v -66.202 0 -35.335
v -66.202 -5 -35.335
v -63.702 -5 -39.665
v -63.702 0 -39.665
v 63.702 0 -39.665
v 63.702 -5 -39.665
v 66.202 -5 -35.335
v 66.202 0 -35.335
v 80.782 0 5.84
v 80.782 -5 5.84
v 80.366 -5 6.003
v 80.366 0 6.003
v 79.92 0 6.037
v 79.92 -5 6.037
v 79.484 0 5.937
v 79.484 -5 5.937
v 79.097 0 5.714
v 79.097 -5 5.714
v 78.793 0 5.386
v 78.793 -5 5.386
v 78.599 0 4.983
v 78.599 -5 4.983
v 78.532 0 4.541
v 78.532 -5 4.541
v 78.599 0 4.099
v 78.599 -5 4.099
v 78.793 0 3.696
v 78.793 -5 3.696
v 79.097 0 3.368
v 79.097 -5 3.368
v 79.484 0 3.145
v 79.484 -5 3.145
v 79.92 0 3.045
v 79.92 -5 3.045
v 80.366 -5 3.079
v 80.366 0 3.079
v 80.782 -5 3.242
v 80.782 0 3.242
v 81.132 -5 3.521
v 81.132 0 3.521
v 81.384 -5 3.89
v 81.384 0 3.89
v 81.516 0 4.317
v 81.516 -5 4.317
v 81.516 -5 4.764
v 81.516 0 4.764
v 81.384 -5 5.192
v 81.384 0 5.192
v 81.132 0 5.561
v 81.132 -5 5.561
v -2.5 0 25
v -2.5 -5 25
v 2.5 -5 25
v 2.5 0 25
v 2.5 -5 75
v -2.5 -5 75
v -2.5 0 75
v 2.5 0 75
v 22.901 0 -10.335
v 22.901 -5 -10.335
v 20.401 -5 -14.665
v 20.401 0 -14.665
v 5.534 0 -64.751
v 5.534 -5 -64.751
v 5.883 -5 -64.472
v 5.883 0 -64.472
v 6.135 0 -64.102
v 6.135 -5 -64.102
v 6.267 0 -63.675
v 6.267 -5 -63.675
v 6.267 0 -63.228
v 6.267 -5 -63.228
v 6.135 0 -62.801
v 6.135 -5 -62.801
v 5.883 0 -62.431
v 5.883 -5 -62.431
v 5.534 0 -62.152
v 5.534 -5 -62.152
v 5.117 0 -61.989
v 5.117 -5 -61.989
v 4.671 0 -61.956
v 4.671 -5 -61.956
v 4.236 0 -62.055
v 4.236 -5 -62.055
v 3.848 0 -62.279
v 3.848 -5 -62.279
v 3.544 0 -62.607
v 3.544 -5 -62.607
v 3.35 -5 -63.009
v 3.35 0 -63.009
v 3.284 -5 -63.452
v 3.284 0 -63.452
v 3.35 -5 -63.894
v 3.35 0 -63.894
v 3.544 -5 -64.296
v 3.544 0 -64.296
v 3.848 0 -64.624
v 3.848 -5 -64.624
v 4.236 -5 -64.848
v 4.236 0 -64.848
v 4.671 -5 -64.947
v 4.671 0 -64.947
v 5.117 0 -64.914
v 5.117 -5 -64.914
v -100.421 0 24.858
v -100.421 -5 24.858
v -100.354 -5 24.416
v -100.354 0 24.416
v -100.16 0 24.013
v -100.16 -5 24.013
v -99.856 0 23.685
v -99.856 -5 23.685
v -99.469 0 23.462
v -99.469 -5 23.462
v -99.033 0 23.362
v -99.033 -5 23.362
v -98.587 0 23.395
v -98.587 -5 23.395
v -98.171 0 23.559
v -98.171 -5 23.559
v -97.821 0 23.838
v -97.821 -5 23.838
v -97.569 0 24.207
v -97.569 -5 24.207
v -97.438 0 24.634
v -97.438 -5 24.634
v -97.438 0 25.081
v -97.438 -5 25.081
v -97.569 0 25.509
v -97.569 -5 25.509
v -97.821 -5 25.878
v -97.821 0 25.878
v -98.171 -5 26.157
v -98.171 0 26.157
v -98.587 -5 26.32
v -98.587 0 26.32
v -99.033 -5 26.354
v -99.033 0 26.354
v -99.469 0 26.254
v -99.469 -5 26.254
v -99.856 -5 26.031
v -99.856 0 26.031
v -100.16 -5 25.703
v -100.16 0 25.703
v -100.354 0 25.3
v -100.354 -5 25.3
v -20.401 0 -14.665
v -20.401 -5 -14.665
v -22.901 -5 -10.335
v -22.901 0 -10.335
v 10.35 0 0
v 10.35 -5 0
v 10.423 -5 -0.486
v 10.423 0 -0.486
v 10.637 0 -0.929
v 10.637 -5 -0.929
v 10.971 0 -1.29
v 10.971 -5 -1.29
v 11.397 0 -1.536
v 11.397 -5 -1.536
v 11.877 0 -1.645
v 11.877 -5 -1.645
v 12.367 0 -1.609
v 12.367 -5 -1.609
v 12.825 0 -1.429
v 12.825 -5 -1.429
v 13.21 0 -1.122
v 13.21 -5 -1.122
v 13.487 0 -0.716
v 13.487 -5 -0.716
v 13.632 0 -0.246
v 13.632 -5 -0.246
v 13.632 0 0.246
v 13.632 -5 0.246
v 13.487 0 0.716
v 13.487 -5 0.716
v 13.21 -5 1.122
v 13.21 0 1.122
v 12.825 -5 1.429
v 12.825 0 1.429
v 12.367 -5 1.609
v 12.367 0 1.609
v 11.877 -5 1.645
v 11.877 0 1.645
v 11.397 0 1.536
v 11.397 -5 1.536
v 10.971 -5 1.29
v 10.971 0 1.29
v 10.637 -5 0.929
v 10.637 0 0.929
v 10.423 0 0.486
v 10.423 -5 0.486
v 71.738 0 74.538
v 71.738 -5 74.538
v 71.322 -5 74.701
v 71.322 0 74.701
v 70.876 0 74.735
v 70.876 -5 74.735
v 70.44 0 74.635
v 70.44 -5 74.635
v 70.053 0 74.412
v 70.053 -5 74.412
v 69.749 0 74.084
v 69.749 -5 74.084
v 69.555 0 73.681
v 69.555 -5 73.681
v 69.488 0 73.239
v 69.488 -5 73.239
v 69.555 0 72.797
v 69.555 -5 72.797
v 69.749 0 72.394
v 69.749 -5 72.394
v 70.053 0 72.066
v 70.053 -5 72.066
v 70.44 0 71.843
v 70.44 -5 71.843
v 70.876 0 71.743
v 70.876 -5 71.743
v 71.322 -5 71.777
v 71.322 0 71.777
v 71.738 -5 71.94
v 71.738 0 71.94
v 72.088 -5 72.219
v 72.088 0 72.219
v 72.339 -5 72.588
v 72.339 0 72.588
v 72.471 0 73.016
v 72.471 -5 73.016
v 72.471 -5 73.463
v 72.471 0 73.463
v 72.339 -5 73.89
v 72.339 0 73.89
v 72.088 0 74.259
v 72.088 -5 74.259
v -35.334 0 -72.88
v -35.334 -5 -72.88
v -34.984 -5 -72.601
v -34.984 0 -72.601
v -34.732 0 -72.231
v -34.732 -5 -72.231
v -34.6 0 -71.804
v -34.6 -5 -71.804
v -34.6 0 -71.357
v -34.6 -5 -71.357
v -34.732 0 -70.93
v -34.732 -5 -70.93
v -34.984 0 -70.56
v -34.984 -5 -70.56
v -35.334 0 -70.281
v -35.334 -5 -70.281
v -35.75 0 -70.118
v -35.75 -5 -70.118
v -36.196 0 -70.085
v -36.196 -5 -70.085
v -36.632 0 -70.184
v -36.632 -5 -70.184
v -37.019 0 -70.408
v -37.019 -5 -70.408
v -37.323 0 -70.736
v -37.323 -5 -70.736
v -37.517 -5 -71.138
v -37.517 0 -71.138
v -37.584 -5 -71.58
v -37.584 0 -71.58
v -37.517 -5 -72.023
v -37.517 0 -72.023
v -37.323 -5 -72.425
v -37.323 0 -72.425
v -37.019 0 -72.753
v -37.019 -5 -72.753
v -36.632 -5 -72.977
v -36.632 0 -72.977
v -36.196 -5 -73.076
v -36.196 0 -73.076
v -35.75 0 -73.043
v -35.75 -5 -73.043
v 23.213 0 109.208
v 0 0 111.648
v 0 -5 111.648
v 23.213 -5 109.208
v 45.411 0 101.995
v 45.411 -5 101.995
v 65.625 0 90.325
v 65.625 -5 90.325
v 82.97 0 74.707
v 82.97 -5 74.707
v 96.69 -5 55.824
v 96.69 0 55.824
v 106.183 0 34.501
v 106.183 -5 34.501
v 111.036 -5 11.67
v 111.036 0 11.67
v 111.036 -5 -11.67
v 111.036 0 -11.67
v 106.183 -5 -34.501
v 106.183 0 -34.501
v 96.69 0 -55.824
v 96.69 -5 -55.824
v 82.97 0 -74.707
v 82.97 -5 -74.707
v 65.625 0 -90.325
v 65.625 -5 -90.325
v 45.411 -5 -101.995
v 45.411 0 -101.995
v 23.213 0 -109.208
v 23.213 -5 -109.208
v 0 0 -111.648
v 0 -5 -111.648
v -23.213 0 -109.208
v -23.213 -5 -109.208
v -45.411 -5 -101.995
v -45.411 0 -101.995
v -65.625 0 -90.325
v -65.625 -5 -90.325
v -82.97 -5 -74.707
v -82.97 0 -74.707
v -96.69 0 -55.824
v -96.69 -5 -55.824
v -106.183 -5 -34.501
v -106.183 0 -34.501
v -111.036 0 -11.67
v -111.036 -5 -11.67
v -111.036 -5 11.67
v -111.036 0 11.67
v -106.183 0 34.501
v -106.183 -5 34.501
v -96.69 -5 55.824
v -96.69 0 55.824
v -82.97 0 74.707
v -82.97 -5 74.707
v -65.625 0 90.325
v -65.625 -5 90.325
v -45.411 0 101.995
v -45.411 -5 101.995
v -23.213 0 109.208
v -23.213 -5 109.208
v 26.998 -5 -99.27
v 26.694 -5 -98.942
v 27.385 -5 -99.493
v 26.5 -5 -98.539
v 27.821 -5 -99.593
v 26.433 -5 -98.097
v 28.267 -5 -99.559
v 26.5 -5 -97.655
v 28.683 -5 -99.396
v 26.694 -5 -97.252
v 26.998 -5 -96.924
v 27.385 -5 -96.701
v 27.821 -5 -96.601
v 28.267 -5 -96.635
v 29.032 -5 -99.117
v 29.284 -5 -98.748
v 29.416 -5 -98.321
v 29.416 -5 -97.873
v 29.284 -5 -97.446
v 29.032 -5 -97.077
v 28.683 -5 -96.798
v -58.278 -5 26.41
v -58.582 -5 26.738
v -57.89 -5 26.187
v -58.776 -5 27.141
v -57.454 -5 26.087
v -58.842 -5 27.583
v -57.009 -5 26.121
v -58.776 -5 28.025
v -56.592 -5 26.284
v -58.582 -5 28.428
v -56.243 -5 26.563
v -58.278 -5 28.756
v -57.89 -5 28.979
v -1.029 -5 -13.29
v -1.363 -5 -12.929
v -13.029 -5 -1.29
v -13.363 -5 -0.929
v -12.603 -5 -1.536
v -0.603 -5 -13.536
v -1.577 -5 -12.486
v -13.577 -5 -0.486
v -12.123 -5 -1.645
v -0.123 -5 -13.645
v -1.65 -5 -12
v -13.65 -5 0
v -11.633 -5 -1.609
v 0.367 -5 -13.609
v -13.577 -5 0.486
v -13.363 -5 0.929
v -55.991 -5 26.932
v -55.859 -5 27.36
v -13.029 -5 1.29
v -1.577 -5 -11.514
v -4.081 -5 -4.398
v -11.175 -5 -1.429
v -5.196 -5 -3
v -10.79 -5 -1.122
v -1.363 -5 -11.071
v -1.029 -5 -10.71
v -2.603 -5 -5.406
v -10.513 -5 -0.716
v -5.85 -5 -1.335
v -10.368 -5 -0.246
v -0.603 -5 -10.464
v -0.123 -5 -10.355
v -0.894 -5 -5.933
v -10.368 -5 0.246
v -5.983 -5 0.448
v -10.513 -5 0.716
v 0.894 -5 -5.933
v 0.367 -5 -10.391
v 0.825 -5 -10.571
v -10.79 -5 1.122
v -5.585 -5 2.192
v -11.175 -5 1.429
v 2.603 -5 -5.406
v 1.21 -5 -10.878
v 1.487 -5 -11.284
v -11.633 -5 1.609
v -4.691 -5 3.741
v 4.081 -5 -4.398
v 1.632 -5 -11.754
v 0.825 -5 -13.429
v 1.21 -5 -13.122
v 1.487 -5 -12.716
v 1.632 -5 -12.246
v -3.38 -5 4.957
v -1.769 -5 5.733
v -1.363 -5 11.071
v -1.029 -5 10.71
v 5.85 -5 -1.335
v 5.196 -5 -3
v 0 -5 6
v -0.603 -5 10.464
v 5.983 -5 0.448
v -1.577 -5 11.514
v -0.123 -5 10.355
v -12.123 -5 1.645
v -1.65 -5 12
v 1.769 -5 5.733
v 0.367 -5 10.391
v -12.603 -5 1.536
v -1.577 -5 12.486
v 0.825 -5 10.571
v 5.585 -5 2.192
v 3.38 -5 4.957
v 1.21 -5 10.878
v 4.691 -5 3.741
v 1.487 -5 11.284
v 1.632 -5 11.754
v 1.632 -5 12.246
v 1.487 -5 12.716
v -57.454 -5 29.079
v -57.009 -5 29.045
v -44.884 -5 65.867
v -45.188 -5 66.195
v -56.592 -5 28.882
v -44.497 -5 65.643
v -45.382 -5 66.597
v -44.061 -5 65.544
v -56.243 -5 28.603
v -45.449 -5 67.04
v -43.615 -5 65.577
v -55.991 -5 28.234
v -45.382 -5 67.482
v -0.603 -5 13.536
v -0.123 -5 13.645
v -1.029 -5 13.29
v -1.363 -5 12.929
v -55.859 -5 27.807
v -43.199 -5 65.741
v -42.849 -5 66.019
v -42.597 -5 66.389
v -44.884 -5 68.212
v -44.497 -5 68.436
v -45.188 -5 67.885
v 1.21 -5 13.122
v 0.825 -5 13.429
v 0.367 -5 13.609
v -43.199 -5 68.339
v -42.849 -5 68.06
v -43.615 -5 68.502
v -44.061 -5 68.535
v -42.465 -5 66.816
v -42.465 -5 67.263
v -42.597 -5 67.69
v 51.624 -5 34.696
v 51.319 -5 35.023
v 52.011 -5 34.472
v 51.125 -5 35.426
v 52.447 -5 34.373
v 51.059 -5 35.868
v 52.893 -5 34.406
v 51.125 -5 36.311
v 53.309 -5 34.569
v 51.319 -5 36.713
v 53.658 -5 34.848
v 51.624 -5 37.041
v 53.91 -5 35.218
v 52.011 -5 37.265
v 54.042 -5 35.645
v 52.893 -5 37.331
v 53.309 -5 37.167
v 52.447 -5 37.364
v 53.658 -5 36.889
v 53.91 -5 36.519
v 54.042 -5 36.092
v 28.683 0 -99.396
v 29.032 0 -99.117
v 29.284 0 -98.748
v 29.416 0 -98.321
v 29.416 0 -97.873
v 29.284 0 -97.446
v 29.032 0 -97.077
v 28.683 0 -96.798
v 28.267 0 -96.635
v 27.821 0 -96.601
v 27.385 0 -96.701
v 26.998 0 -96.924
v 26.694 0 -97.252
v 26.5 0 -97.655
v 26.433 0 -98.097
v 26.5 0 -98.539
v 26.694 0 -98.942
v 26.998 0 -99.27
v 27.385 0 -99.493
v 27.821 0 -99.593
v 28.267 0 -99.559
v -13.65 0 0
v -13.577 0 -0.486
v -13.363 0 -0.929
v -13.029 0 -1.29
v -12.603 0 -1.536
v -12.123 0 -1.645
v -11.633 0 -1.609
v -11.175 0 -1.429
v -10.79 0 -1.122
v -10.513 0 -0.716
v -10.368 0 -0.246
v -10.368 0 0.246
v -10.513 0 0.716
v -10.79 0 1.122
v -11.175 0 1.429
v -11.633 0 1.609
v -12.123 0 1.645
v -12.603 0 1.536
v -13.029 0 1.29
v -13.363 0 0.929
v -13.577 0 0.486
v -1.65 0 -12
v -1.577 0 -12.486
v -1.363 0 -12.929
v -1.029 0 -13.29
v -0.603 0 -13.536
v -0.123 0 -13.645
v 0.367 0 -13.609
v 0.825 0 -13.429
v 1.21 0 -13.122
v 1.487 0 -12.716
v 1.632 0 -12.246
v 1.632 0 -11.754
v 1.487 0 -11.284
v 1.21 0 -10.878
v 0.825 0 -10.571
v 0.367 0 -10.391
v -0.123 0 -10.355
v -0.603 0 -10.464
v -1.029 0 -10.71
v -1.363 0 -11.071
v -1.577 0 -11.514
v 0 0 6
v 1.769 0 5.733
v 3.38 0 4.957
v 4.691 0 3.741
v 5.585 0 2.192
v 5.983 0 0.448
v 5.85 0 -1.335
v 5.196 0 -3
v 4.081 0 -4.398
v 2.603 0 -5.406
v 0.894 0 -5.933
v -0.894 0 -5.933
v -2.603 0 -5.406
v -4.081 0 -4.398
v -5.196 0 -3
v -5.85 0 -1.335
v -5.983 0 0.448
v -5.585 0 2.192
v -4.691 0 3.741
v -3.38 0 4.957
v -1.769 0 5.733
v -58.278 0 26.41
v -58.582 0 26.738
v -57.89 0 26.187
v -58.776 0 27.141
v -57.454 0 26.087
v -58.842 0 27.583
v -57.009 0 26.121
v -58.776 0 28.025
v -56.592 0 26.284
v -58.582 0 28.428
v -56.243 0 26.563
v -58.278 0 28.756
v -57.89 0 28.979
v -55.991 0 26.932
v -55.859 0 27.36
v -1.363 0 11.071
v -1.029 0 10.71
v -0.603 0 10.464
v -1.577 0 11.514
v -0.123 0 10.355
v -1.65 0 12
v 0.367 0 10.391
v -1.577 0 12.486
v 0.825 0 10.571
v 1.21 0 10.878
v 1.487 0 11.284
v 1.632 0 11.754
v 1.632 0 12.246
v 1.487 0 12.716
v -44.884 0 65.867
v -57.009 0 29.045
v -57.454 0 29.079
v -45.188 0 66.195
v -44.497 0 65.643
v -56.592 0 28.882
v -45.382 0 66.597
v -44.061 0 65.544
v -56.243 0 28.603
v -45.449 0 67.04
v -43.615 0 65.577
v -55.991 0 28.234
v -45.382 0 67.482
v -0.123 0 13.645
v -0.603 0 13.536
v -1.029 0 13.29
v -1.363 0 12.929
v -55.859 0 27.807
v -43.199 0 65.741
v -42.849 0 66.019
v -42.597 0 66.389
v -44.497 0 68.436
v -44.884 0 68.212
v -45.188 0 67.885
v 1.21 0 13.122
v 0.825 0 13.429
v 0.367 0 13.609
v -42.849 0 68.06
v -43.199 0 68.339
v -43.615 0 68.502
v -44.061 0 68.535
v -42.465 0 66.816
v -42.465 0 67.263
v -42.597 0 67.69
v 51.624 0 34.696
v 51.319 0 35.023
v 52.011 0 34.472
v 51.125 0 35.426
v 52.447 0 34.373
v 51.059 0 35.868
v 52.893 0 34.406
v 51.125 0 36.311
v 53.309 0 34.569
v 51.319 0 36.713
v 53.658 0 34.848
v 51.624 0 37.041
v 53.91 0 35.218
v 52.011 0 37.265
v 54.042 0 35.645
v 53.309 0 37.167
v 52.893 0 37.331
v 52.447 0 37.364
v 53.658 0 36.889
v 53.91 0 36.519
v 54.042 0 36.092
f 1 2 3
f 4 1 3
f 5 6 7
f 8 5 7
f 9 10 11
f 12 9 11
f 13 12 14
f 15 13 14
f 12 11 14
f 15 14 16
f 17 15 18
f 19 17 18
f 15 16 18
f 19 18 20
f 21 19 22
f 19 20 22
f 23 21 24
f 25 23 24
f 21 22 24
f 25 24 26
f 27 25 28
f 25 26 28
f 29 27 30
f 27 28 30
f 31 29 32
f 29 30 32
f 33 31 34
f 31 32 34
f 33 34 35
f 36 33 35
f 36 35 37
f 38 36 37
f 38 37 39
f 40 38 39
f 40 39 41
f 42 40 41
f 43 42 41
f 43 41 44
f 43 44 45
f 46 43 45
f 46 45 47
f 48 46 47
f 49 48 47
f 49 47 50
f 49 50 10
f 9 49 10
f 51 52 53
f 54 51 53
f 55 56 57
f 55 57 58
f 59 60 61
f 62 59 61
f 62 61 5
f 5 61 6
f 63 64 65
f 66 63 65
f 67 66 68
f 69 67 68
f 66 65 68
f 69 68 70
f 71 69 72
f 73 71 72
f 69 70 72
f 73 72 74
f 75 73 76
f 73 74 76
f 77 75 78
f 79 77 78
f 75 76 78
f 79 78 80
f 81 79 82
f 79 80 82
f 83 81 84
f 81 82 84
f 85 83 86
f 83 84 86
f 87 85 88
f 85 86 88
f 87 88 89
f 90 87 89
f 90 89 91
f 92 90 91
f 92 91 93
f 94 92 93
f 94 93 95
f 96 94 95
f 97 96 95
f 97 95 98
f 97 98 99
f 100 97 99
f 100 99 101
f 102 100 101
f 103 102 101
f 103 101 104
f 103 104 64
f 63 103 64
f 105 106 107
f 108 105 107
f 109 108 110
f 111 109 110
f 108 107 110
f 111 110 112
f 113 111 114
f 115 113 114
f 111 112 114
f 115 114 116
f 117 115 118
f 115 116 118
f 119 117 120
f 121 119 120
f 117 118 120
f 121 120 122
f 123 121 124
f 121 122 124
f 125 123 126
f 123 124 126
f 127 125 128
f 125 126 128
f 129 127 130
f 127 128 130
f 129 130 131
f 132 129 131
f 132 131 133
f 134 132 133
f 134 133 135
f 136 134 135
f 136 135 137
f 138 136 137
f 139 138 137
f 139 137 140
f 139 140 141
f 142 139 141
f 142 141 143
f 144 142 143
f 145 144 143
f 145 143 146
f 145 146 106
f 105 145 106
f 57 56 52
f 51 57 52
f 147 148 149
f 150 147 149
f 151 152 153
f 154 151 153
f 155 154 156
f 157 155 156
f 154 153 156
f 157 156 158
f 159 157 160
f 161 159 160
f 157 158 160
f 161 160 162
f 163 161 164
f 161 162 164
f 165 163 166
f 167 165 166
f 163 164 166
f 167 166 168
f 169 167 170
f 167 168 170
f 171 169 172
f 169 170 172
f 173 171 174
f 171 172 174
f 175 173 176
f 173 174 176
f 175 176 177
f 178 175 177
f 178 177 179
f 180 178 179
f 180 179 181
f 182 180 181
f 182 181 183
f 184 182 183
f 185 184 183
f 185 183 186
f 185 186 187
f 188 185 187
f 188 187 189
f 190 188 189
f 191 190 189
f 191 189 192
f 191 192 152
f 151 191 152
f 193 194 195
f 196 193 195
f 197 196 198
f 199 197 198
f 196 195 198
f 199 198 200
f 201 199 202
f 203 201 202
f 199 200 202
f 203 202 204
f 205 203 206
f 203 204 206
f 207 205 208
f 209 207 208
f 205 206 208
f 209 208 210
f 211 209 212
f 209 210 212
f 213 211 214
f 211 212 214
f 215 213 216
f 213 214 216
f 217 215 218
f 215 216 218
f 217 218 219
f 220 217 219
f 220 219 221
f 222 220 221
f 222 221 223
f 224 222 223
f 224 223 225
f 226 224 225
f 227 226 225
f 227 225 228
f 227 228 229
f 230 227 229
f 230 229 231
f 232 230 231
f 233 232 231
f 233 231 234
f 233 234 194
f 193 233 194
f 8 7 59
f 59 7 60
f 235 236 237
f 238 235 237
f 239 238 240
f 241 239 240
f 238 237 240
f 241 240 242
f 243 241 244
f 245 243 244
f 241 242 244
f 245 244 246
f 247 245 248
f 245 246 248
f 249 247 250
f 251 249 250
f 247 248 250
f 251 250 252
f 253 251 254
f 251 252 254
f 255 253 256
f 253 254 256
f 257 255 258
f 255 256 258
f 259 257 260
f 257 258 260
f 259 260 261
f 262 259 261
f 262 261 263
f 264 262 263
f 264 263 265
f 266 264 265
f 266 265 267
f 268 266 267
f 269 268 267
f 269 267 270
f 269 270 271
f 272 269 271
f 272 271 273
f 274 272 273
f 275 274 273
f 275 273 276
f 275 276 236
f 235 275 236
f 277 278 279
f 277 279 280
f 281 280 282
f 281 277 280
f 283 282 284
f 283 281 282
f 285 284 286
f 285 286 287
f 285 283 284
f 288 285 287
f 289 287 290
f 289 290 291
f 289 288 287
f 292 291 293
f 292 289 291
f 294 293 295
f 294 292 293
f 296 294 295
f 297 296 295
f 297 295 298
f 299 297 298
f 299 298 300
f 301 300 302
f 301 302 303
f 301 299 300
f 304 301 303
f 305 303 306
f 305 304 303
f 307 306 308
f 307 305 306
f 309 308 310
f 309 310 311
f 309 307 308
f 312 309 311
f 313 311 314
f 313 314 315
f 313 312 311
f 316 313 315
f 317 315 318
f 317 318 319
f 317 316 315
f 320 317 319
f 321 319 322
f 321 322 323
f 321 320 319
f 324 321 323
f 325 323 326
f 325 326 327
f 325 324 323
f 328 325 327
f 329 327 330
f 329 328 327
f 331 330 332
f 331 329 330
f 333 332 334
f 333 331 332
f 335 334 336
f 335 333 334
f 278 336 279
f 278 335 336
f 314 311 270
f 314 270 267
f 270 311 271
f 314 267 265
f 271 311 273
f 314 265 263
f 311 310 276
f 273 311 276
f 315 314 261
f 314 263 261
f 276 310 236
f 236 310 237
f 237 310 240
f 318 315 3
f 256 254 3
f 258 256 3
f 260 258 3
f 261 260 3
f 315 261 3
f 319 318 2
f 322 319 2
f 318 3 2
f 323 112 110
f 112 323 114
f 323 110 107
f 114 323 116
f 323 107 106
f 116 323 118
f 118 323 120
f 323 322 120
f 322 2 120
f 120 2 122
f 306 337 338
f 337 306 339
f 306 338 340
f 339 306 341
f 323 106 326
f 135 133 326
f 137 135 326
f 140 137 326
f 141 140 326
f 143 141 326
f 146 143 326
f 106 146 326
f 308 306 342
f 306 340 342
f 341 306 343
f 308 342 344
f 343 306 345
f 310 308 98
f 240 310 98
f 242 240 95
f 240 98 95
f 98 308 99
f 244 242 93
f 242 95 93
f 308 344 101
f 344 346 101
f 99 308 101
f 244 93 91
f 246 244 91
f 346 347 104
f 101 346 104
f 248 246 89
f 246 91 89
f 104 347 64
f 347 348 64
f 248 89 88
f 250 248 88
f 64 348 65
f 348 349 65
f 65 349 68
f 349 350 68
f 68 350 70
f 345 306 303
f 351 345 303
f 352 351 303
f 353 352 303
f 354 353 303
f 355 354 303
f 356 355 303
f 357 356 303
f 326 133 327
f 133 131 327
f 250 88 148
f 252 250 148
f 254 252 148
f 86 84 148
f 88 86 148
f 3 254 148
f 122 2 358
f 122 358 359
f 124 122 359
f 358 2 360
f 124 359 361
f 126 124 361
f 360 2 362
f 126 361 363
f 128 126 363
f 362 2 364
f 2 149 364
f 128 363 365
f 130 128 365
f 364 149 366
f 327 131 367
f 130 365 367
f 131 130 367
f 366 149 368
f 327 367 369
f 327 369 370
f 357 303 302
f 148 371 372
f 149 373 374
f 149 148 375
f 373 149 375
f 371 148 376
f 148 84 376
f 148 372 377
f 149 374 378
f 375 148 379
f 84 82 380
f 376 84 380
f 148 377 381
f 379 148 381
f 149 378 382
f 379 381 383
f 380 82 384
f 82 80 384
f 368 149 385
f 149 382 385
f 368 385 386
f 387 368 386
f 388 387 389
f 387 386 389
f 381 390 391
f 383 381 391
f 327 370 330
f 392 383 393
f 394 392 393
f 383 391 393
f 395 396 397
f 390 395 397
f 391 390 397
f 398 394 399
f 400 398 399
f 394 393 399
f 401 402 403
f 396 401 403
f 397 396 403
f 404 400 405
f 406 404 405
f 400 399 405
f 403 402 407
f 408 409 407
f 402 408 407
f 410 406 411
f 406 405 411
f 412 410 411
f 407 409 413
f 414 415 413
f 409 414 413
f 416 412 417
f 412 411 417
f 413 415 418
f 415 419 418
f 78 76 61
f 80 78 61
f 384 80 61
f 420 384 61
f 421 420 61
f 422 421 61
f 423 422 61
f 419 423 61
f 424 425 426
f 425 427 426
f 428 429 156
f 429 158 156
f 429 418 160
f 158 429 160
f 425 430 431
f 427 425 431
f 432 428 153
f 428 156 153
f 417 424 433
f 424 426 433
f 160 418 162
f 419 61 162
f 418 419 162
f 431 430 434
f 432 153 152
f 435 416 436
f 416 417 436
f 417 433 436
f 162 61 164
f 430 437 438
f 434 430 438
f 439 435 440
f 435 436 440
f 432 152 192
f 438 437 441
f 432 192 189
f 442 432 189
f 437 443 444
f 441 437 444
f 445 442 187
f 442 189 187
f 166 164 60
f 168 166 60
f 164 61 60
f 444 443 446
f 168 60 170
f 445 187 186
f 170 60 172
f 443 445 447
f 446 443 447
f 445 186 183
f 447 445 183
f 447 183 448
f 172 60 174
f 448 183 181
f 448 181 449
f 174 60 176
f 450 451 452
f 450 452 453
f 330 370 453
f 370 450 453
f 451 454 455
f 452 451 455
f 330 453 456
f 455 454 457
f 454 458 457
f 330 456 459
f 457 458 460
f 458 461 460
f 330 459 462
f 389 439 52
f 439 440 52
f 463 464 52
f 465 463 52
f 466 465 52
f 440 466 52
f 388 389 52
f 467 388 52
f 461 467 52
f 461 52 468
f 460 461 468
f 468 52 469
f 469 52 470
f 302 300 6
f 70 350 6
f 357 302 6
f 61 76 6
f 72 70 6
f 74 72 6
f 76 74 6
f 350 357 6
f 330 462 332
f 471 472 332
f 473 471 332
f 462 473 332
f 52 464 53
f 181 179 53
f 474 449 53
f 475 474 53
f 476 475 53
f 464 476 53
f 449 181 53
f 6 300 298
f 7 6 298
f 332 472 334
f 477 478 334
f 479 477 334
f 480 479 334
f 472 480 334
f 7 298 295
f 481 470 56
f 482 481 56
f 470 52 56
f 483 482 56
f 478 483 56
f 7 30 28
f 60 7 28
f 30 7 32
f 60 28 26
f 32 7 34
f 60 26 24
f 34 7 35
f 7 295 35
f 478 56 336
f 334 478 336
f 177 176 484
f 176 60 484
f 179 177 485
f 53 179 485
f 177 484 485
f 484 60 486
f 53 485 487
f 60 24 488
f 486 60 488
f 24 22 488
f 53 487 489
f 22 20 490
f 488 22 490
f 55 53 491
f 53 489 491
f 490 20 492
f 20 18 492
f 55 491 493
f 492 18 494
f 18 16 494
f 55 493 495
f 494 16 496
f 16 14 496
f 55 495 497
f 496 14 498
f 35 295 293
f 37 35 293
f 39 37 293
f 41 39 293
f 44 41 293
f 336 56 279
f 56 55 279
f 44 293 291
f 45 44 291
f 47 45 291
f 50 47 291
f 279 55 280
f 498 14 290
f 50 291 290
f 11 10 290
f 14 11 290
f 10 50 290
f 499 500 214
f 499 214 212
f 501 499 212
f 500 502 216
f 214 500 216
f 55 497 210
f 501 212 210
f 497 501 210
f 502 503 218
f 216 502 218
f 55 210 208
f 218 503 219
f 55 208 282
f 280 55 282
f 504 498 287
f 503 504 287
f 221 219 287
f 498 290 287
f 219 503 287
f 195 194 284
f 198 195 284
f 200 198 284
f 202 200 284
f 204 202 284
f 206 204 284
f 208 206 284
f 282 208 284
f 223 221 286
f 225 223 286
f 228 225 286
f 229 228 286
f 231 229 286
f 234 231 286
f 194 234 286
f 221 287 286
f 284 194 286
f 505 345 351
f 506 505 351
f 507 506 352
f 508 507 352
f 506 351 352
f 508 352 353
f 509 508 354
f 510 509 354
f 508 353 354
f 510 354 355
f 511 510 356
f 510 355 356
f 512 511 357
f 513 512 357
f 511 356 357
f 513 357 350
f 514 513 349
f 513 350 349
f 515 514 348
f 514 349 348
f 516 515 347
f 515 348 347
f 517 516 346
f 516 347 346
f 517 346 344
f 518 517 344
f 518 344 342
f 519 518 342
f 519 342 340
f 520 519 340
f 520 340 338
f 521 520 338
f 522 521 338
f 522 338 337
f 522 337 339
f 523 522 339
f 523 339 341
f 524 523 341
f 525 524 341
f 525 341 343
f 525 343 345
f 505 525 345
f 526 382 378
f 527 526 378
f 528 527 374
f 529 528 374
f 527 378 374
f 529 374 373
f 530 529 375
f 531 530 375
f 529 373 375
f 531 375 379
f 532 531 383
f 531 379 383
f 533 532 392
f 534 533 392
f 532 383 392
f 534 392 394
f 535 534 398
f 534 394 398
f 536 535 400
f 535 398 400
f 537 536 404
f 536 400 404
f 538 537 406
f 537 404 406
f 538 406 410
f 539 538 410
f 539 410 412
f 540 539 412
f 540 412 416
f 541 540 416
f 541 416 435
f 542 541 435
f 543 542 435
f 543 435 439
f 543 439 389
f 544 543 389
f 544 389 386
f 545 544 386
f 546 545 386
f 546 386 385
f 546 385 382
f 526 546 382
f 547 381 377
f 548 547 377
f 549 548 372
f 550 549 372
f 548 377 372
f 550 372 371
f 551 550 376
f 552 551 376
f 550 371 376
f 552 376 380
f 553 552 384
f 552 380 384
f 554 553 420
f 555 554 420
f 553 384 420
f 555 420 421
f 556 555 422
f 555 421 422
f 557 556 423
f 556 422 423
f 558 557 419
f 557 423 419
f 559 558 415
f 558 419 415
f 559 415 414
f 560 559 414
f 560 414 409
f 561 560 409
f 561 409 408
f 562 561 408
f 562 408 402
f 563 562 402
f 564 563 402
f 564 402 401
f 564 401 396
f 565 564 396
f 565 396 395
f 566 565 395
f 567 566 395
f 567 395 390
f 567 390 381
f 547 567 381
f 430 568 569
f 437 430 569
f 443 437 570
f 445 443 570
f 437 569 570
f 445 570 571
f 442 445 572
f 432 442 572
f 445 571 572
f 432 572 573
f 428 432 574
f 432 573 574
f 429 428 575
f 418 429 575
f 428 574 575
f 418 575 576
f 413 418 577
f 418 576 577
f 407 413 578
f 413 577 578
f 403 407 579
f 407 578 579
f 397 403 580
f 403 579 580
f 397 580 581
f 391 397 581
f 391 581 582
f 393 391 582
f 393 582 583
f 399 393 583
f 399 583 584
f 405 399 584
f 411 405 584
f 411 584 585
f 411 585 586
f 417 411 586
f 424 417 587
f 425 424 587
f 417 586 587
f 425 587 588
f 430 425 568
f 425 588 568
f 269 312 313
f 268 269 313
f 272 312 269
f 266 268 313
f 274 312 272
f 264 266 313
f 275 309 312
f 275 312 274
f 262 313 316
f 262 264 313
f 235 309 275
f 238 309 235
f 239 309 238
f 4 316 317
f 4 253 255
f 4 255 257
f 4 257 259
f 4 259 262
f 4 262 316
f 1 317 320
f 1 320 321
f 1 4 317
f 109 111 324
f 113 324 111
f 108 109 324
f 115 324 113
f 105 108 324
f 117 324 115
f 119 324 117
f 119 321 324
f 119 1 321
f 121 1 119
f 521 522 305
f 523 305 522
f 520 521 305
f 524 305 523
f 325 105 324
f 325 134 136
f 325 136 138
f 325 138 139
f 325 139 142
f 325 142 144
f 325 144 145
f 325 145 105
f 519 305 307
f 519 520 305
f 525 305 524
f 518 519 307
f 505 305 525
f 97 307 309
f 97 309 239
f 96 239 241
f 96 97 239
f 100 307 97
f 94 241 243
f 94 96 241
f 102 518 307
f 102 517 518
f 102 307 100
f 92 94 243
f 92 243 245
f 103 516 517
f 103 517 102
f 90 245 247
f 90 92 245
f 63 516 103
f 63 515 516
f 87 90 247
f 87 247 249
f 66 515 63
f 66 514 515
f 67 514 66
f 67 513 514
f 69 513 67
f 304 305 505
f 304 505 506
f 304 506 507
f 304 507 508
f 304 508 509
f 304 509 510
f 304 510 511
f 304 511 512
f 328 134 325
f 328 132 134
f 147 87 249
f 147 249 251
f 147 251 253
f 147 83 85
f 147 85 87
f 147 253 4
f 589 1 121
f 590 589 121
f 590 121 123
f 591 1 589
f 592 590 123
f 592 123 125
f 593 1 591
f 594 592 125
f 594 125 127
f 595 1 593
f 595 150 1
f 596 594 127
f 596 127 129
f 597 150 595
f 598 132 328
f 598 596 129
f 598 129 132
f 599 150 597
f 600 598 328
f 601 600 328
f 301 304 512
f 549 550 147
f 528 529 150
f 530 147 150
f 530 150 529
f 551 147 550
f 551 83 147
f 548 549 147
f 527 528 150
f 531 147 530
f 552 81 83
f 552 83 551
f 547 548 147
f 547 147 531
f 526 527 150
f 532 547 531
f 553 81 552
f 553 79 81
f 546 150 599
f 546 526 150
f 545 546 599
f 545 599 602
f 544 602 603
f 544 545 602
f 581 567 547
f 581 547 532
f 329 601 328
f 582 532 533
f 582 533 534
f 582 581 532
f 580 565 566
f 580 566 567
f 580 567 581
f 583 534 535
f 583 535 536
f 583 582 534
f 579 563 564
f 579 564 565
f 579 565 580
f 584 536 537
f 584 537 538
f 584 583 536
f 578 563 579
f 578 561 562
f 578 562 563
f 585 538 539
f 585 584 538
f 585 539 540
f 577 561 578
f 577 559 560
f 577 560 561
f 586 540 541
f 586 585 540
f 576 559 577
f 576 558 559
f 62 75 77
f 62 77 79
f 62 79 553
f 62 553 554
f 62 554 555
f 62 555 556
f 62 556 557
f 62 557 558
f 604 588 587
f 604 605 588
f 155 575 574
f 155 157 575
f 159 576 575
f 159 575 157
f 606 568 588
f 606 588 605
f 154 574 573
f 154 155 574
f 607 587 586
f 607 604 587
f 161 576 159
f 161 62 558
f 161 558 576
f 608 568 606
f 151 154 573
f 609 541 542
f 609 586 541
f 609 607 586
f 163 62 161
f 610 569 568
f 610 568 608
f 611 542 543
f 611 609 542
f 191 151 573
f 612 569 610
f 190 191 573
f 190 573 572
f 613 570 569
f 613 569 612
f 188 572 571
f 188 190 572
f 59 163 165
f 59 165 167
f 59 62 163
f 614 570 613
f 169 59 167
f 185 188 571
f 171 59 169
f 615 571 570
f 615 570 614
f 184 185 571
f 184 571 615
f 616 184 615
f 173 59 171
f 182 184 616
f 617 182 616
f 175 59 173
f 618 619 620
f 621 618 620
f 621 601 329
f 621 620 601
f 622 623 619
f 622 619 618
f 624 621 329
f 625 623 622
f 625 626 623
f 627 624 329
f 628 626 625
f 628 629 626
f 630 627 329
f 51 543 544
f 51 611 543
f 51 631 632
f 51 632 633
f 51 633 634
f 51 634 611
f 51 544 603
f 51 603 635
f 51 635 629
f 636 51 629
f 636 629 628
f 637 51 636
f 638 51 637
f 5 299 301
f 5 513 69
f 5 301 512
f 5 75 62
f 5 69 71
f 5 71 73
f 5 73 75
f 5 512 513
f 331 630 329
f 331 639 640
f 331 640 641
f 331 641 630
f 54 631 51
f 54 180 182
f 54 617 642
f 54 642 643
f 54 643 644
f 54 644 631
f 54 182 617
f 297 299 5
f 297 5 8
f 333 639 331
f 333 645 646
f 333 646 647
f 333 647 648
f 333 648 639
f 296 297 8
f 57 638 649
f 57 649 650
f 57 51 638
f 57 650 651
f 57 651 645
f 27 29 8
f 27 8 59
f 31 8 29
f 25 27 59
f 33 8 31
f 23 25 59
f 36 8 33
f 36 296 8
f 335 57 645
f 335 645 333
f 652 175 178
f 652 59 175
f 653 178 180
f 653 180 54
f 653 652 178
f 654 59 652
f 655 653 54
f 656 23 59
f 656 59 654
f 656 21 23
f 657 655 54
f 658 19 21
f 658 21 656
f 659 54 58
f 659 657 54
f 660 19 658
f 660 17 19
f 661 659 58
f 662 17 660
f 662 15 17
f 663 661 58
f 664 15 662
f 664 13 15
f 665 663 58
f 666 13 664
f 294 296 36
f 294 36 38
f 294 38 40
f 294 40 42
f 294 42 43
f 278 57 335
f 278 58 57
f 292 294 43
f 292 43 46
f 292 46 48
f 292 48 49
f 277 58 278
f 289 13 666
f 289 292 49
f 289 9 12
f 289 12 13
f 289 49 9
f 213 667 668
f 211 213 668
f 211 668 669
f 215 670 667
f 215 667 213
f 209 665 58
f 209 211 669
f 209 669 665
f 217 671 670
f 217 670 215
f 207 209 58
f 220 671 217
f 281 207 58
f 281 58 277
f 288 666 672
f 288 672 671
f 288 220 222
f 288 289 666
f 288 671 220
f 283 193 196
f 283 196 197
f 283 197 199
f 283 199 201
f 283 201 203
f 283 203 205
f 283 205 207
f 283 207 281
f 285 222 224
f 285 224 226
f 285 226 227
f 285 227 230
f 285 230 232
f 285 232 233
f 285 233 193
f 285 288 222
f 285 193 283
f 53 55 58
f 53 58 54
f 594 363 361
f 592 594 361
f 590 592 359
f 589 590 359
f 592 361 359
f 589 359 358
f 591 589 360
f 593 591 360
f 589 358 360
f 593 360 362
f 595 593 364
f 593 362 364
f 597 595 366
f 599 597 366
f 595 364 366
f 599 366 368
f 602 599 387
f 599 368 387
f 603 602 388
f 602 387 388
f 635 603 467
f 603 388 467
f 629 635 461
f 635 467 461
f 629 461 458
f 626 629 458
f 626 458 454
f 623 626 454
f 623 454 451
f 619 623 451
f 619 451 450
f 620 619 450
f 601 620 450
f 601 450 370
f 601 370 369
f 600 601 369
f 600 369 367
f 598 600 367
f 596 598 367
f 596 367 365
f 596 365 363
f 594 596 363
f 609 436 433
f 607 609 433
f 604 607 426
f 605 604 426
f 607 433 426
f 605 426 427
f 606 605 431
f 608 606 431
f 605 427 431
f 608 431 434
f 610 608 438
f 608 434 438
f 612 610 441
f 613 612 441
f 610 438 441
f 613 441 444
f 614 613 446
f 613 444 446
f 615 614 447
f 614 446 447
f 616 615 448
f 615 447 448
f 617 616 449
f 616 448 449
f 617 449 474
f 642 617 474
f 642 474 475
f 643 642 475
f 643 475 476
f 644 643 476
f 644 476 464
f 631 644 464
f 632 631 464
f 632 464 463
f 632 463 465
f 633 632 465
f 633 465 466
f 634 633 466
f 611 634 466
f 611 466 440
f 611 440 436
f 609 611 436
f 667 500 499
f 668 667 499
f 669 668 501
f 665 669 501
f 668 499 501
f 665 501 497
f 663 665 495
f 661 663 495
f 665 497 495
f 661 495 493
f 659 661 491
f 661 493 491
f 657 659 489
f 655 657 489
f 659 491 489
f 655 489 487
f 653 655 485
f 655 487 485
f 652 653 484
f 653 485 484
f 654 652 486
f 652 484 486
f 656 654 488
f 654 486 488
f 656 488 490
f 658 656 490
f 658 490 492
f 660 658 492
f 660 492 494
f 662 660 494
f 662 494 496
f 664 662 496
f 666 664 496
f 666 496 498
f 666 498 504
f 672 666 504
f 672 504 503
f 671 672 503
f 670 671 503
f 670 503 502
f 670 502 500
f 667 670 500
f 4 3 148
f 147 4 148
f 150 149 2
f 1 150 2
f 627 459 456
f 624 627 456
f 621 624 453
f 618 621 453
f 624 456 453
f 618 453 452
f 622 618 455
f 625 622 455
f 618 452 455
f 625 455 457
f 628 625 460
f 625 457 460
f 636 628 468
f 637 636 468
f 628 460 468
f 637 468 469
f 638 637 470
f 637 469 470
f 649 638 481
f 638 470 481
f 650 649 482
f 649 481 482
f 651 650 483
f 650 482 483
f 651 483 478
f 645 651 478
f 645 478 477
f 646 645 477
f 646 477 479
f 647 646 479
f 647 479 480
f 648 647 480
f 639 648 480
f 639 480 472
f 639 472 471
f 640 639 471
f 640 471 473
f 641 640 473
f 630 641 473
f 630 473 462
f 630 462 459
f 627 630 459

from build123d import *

# Parameters (mm, degrees)
SKETCH_1_R               = 6
EXTRUDE_1_DEPTH          = 5
CUT_EXTRUDE_1_DEPTH      = 142.435598161
CUT_EXTRUDE_1_DEPTH_BACK = 142.435598161
SKETCH_5_W               = 5
SKETCH_5_H               = 50
SKETCH_6_R               = 111.64768953
EXTRUDE_4_DEPTH          = 5
F_3_0MM_1_D              = 3
PATTERN_CIRCULAR_1_COUNT = 3
HOLE_WIZARD_M4_1_D       = 3.3


with BuildPart() as part:
    # 草圖1 → 填料-伸長1 (new body)
    with BuildSketch(Plane(origin=(0, 0, 0), x_dir=(1, 0, 0), z_dir=(0, 1, 0))):
        with BuildLine():
            ThreePointArc((-54.140127389, 84.076433121), (-86.602540378, 50), (-99.882390637, 4.848509122))
            ThreePointArc((-99.882390637, 4.848509122), (-94.722486108, -4.890404948), (-83.701905284, -5.024047358))
            ThreePointArc((-83.701905284, -5.024047358), (-32.475952642, -18.75), (-46.201905284, -69.975952642))
            ThreePointArc((-46.201905284, -69.975952642), (-51.596457973, -79.586876805), (-45.742263248, -88.924942243))
            ThreePointArc((-45.742263248, -88.924942243), (0, -100), (45.742263248, -88.924942243))
            ThreePointArc((45.742263248, -88.924942243), (51.596457973, -79.586876805), (46.201905284, -69.975952642))
            ThreePointArc((46.201905284, -69.975952642), (32.475952642, -18.75), (83.701905284, -5.024047358))
            ThreePointArc((83.701905284, -5.024047358), (94.722486108, -4.890404948), (99.882390637, 4.848509122))
            ThreePointArc((99.882390637, 4.848509122), (86.602540378, 50), (54.140127389, 84.076433121))
            ThreePointArc((54.140127389, 84.076433121), (43.126028135, 84.477281753), (37.5, 75))
            ThreePointArc((37.5, 75), (0, 37.5), (-37.5, 75))
            ThreePointArc((-37.5, 75), (-43.126028135, 84.477281753), (-54.140127389, 84.076433121))
        make_face()
        with Locations(Location((0, 0, 0), (0, 0, 270))):
            Circle(SKETCH_1_R, mode=Mode.SUBTRACT)
    extrude(amount=-EXTRUDE_1_DEPTH)

    # 草圖5 → 除料-伸長1 (cut, two sides: drawn at the far end of the back side and taken through both)
    with BuildSketch(Plane(origin=(0, 0, 0), x_dir=(1, 0, 0), z_dir=(0, 1, 0)).offset(-CUT_EXTRUDE_1_DEPTH_BACK)):
        with BuildLine():
            ThreePointArc((18.659757868, -98.243643236), (-14.320442433, -98.969313065), (-45.742263248, -88.924942243))
            ThreePointArc((-45.742263248, -88.924942243), (-51.596457973, -79.586876805), (-46.201905284, -69.975952642))
            ThreePointArc((-46.201905284, -69.975952642), (-35.201155023, -60.328553588), (-28.729686798, -47.205714191))
            ThreePointArc((-28.729686798, -47.205714191), (-19.144613028, -85.825688538), (18.659757868, -98.243643236))
        make_face()
        with BuildLine():
            ThreePointArc((75.751611869, 65.28164596), (92.870160526, 37.082789592), (99.882390637, 4.848509122))
            ThreePointArc((99.882390637, 4.848509122), (94.722486108, -4.890404948), (83.701905284, -5.024047358))
            ThreePointArc((83.701905284, -5.024047358), (69.846637492, -0.320817698), (55.246191092, -1.277781514))
            ThreePointArc((55.246191092, -1.277781514), (83.899533086, 26.333123041), (75.751611869, 65.28164596))
        make_face()
        Polygon((-20.400635095, 14.665063509), (-22.900635095, 10.334936491), (-66.201905284, 35.334936491), (-63.701905284, 39.665063509), align=None)
        with Locations((0, -50)):
            Rectangle(SKETCH_5_W, SKETCH_5_H)
        Polygon((22.900635095, 10.334936491), (20.400635095, 14.665063509), (63.701905284, 39.665063509), (66.201905284, 35.334936491), align=None)
        with BuildLine():
            ThreePointArc((-37.5, 75), (-34.645482469, 60.649371286), (-26.516504294, 48.483495706))
            ThreePointArc((-26.516504294, 48.483495706), (-64.754920057, 59.492565497), (-94.411369737, 32.961997276))
            ThreePointArc((-94.411369737, 32.961997276), (-78.549718093, 61.886523473), (-54.140127389, 84.076433121))
            ThreePointArc((-54.140127389, 84.076433121), (-43.126028135, 84.477281753), (-37.5, 75))
        make_face()
    extrude(amount=CUT_EXTRUDE_1_DEPTH + CUT_EXTRUDE_1_DEPTH_BACK, mode=Mode.SUBTRACT)

    # 草圖6 → 填料-伸長4 (add)
    # profile 1 of 2: a face of its own
    with BuildSketch(Plane(origin=(0, 0, 0), x_dir=(1, 0, 0), z_dir=(0, 1, 0))):
        with Locations(Location((0, 0, 0), (0, 0, 270))):
            Circle(SKETCH_6_R)
        with BuildLine():
            Line((-64.951905284, -37.5), (-28.729686798, -47.205714191))
            ThreePointArc((-28.729686798, -47.205714191), (-19.144613028, -85.825688538), (18.659757868, -98.243643236))
            ThreePointArc((18.659757868, -98.243643236), (32.536358555, -94.558898957), (45.742263248, -88.924942243))
            ThreePointArc((45.742263248, -88.924942243), (51.596457973, -79.586876805), (46.201905284, -69.975952642))
            ThreePointArc((46.201905284, -69.975952642), (27.772722982, -32.605267792), (55.246191092, -1.277781514))
            ThreePointArc((55.246191092, -1.277781514), (83.899533086, 26.333123041), (75.751611869, 65.28164596))
            ThreePointArc((75.751611869, 65.28164596), (65.622229374, 75.456762534), (54.140127389, 84.076433121))
            ThreePointArc((54.140127389, 84.076433121), (43.126028135, 84.477281753), (37.5, 75))
            ThreePointArc((37.5, 75), (14.350628714, 40.354517531), (-26.516504294, 48.483495706))
            ThreePointArc((-26.516504294, 48.483495706), (-64.754920057, 59.492565497), (-94.411369737, 32.961997276))
            ThreePointArc((-94.411369737, 32.961997276), (-98.158587928, 19.102136424), (-99.882390637, 4.848509122))
            ThreePointArc((-99.882390637, 4.848509122), (-94.722486108, -4.890404948), (-83.701905284, -5.024047358))
            Line((-83.701905284, -5.024047358), (-64.951905284, -37.5))
        make_face(mode=Mode.SUBTRACT)
    # profile 2 of 2: a face of its own
    with BuildSketch(Plane(origin=(0, 0, 0), x_dir=(1, 0, 0), z_dir=(0, 1, 0))):
        with BuildLine():
            Line((-83.701905284, -5.024047358), (-64.951905284, -37.5))
            Line((-64.951905284, -37.5), (-28.729686798, -47.205714191))
            ThreePointArc((-28.729686798, -47.205714191), (-42.123351696, -7.749249739), (-83.701905284, -5.024047358))
        make_face()
    extrude(amount=-EXTRUDE_4_DEPTH)

    # Ø3.0mm 定位孔1 (through all)
    with Locations(Plane(origin=(0, 0, 0), x_dir=(1, 0, 0), z_dir=(0, 1, 0))):
        with Locations((-43.948722523, -67.039547699), (-57.342387421, -27.583083246), (-98.920941009, -24.857880865)):
            f_3_0mm_1 = Hole(F_3_0MM_1_D / 2)

    # 環狀複製排列1: Ø3.0mm 定位孔1 ×3 about axis
    pattern_circular_1_axis = Axis((0, 0, 0), (0, 1, 0))
    for i in range(1, PATTERN_CIRCULAR_1_COUNT):
        add(f_3_0mm_1.rotate(pattern_circular_1_axis, i * 360 / PATTERN_CIRCULAR_1_COUNT), mode=Mode.SUBTRACT)

    # M4 螺紋孔1 (through all)
    with Locations(Plane(origin=(0, 0, 0), x_dir=(1, 0, 0), z_dir=(0, 1, 0))):
        with Locations((0, 12), (12, 0), (0, -12), (-12, 0)):
            Hole(HOLE_WIZARD_M4_1_D / 2)


solid = part.part
